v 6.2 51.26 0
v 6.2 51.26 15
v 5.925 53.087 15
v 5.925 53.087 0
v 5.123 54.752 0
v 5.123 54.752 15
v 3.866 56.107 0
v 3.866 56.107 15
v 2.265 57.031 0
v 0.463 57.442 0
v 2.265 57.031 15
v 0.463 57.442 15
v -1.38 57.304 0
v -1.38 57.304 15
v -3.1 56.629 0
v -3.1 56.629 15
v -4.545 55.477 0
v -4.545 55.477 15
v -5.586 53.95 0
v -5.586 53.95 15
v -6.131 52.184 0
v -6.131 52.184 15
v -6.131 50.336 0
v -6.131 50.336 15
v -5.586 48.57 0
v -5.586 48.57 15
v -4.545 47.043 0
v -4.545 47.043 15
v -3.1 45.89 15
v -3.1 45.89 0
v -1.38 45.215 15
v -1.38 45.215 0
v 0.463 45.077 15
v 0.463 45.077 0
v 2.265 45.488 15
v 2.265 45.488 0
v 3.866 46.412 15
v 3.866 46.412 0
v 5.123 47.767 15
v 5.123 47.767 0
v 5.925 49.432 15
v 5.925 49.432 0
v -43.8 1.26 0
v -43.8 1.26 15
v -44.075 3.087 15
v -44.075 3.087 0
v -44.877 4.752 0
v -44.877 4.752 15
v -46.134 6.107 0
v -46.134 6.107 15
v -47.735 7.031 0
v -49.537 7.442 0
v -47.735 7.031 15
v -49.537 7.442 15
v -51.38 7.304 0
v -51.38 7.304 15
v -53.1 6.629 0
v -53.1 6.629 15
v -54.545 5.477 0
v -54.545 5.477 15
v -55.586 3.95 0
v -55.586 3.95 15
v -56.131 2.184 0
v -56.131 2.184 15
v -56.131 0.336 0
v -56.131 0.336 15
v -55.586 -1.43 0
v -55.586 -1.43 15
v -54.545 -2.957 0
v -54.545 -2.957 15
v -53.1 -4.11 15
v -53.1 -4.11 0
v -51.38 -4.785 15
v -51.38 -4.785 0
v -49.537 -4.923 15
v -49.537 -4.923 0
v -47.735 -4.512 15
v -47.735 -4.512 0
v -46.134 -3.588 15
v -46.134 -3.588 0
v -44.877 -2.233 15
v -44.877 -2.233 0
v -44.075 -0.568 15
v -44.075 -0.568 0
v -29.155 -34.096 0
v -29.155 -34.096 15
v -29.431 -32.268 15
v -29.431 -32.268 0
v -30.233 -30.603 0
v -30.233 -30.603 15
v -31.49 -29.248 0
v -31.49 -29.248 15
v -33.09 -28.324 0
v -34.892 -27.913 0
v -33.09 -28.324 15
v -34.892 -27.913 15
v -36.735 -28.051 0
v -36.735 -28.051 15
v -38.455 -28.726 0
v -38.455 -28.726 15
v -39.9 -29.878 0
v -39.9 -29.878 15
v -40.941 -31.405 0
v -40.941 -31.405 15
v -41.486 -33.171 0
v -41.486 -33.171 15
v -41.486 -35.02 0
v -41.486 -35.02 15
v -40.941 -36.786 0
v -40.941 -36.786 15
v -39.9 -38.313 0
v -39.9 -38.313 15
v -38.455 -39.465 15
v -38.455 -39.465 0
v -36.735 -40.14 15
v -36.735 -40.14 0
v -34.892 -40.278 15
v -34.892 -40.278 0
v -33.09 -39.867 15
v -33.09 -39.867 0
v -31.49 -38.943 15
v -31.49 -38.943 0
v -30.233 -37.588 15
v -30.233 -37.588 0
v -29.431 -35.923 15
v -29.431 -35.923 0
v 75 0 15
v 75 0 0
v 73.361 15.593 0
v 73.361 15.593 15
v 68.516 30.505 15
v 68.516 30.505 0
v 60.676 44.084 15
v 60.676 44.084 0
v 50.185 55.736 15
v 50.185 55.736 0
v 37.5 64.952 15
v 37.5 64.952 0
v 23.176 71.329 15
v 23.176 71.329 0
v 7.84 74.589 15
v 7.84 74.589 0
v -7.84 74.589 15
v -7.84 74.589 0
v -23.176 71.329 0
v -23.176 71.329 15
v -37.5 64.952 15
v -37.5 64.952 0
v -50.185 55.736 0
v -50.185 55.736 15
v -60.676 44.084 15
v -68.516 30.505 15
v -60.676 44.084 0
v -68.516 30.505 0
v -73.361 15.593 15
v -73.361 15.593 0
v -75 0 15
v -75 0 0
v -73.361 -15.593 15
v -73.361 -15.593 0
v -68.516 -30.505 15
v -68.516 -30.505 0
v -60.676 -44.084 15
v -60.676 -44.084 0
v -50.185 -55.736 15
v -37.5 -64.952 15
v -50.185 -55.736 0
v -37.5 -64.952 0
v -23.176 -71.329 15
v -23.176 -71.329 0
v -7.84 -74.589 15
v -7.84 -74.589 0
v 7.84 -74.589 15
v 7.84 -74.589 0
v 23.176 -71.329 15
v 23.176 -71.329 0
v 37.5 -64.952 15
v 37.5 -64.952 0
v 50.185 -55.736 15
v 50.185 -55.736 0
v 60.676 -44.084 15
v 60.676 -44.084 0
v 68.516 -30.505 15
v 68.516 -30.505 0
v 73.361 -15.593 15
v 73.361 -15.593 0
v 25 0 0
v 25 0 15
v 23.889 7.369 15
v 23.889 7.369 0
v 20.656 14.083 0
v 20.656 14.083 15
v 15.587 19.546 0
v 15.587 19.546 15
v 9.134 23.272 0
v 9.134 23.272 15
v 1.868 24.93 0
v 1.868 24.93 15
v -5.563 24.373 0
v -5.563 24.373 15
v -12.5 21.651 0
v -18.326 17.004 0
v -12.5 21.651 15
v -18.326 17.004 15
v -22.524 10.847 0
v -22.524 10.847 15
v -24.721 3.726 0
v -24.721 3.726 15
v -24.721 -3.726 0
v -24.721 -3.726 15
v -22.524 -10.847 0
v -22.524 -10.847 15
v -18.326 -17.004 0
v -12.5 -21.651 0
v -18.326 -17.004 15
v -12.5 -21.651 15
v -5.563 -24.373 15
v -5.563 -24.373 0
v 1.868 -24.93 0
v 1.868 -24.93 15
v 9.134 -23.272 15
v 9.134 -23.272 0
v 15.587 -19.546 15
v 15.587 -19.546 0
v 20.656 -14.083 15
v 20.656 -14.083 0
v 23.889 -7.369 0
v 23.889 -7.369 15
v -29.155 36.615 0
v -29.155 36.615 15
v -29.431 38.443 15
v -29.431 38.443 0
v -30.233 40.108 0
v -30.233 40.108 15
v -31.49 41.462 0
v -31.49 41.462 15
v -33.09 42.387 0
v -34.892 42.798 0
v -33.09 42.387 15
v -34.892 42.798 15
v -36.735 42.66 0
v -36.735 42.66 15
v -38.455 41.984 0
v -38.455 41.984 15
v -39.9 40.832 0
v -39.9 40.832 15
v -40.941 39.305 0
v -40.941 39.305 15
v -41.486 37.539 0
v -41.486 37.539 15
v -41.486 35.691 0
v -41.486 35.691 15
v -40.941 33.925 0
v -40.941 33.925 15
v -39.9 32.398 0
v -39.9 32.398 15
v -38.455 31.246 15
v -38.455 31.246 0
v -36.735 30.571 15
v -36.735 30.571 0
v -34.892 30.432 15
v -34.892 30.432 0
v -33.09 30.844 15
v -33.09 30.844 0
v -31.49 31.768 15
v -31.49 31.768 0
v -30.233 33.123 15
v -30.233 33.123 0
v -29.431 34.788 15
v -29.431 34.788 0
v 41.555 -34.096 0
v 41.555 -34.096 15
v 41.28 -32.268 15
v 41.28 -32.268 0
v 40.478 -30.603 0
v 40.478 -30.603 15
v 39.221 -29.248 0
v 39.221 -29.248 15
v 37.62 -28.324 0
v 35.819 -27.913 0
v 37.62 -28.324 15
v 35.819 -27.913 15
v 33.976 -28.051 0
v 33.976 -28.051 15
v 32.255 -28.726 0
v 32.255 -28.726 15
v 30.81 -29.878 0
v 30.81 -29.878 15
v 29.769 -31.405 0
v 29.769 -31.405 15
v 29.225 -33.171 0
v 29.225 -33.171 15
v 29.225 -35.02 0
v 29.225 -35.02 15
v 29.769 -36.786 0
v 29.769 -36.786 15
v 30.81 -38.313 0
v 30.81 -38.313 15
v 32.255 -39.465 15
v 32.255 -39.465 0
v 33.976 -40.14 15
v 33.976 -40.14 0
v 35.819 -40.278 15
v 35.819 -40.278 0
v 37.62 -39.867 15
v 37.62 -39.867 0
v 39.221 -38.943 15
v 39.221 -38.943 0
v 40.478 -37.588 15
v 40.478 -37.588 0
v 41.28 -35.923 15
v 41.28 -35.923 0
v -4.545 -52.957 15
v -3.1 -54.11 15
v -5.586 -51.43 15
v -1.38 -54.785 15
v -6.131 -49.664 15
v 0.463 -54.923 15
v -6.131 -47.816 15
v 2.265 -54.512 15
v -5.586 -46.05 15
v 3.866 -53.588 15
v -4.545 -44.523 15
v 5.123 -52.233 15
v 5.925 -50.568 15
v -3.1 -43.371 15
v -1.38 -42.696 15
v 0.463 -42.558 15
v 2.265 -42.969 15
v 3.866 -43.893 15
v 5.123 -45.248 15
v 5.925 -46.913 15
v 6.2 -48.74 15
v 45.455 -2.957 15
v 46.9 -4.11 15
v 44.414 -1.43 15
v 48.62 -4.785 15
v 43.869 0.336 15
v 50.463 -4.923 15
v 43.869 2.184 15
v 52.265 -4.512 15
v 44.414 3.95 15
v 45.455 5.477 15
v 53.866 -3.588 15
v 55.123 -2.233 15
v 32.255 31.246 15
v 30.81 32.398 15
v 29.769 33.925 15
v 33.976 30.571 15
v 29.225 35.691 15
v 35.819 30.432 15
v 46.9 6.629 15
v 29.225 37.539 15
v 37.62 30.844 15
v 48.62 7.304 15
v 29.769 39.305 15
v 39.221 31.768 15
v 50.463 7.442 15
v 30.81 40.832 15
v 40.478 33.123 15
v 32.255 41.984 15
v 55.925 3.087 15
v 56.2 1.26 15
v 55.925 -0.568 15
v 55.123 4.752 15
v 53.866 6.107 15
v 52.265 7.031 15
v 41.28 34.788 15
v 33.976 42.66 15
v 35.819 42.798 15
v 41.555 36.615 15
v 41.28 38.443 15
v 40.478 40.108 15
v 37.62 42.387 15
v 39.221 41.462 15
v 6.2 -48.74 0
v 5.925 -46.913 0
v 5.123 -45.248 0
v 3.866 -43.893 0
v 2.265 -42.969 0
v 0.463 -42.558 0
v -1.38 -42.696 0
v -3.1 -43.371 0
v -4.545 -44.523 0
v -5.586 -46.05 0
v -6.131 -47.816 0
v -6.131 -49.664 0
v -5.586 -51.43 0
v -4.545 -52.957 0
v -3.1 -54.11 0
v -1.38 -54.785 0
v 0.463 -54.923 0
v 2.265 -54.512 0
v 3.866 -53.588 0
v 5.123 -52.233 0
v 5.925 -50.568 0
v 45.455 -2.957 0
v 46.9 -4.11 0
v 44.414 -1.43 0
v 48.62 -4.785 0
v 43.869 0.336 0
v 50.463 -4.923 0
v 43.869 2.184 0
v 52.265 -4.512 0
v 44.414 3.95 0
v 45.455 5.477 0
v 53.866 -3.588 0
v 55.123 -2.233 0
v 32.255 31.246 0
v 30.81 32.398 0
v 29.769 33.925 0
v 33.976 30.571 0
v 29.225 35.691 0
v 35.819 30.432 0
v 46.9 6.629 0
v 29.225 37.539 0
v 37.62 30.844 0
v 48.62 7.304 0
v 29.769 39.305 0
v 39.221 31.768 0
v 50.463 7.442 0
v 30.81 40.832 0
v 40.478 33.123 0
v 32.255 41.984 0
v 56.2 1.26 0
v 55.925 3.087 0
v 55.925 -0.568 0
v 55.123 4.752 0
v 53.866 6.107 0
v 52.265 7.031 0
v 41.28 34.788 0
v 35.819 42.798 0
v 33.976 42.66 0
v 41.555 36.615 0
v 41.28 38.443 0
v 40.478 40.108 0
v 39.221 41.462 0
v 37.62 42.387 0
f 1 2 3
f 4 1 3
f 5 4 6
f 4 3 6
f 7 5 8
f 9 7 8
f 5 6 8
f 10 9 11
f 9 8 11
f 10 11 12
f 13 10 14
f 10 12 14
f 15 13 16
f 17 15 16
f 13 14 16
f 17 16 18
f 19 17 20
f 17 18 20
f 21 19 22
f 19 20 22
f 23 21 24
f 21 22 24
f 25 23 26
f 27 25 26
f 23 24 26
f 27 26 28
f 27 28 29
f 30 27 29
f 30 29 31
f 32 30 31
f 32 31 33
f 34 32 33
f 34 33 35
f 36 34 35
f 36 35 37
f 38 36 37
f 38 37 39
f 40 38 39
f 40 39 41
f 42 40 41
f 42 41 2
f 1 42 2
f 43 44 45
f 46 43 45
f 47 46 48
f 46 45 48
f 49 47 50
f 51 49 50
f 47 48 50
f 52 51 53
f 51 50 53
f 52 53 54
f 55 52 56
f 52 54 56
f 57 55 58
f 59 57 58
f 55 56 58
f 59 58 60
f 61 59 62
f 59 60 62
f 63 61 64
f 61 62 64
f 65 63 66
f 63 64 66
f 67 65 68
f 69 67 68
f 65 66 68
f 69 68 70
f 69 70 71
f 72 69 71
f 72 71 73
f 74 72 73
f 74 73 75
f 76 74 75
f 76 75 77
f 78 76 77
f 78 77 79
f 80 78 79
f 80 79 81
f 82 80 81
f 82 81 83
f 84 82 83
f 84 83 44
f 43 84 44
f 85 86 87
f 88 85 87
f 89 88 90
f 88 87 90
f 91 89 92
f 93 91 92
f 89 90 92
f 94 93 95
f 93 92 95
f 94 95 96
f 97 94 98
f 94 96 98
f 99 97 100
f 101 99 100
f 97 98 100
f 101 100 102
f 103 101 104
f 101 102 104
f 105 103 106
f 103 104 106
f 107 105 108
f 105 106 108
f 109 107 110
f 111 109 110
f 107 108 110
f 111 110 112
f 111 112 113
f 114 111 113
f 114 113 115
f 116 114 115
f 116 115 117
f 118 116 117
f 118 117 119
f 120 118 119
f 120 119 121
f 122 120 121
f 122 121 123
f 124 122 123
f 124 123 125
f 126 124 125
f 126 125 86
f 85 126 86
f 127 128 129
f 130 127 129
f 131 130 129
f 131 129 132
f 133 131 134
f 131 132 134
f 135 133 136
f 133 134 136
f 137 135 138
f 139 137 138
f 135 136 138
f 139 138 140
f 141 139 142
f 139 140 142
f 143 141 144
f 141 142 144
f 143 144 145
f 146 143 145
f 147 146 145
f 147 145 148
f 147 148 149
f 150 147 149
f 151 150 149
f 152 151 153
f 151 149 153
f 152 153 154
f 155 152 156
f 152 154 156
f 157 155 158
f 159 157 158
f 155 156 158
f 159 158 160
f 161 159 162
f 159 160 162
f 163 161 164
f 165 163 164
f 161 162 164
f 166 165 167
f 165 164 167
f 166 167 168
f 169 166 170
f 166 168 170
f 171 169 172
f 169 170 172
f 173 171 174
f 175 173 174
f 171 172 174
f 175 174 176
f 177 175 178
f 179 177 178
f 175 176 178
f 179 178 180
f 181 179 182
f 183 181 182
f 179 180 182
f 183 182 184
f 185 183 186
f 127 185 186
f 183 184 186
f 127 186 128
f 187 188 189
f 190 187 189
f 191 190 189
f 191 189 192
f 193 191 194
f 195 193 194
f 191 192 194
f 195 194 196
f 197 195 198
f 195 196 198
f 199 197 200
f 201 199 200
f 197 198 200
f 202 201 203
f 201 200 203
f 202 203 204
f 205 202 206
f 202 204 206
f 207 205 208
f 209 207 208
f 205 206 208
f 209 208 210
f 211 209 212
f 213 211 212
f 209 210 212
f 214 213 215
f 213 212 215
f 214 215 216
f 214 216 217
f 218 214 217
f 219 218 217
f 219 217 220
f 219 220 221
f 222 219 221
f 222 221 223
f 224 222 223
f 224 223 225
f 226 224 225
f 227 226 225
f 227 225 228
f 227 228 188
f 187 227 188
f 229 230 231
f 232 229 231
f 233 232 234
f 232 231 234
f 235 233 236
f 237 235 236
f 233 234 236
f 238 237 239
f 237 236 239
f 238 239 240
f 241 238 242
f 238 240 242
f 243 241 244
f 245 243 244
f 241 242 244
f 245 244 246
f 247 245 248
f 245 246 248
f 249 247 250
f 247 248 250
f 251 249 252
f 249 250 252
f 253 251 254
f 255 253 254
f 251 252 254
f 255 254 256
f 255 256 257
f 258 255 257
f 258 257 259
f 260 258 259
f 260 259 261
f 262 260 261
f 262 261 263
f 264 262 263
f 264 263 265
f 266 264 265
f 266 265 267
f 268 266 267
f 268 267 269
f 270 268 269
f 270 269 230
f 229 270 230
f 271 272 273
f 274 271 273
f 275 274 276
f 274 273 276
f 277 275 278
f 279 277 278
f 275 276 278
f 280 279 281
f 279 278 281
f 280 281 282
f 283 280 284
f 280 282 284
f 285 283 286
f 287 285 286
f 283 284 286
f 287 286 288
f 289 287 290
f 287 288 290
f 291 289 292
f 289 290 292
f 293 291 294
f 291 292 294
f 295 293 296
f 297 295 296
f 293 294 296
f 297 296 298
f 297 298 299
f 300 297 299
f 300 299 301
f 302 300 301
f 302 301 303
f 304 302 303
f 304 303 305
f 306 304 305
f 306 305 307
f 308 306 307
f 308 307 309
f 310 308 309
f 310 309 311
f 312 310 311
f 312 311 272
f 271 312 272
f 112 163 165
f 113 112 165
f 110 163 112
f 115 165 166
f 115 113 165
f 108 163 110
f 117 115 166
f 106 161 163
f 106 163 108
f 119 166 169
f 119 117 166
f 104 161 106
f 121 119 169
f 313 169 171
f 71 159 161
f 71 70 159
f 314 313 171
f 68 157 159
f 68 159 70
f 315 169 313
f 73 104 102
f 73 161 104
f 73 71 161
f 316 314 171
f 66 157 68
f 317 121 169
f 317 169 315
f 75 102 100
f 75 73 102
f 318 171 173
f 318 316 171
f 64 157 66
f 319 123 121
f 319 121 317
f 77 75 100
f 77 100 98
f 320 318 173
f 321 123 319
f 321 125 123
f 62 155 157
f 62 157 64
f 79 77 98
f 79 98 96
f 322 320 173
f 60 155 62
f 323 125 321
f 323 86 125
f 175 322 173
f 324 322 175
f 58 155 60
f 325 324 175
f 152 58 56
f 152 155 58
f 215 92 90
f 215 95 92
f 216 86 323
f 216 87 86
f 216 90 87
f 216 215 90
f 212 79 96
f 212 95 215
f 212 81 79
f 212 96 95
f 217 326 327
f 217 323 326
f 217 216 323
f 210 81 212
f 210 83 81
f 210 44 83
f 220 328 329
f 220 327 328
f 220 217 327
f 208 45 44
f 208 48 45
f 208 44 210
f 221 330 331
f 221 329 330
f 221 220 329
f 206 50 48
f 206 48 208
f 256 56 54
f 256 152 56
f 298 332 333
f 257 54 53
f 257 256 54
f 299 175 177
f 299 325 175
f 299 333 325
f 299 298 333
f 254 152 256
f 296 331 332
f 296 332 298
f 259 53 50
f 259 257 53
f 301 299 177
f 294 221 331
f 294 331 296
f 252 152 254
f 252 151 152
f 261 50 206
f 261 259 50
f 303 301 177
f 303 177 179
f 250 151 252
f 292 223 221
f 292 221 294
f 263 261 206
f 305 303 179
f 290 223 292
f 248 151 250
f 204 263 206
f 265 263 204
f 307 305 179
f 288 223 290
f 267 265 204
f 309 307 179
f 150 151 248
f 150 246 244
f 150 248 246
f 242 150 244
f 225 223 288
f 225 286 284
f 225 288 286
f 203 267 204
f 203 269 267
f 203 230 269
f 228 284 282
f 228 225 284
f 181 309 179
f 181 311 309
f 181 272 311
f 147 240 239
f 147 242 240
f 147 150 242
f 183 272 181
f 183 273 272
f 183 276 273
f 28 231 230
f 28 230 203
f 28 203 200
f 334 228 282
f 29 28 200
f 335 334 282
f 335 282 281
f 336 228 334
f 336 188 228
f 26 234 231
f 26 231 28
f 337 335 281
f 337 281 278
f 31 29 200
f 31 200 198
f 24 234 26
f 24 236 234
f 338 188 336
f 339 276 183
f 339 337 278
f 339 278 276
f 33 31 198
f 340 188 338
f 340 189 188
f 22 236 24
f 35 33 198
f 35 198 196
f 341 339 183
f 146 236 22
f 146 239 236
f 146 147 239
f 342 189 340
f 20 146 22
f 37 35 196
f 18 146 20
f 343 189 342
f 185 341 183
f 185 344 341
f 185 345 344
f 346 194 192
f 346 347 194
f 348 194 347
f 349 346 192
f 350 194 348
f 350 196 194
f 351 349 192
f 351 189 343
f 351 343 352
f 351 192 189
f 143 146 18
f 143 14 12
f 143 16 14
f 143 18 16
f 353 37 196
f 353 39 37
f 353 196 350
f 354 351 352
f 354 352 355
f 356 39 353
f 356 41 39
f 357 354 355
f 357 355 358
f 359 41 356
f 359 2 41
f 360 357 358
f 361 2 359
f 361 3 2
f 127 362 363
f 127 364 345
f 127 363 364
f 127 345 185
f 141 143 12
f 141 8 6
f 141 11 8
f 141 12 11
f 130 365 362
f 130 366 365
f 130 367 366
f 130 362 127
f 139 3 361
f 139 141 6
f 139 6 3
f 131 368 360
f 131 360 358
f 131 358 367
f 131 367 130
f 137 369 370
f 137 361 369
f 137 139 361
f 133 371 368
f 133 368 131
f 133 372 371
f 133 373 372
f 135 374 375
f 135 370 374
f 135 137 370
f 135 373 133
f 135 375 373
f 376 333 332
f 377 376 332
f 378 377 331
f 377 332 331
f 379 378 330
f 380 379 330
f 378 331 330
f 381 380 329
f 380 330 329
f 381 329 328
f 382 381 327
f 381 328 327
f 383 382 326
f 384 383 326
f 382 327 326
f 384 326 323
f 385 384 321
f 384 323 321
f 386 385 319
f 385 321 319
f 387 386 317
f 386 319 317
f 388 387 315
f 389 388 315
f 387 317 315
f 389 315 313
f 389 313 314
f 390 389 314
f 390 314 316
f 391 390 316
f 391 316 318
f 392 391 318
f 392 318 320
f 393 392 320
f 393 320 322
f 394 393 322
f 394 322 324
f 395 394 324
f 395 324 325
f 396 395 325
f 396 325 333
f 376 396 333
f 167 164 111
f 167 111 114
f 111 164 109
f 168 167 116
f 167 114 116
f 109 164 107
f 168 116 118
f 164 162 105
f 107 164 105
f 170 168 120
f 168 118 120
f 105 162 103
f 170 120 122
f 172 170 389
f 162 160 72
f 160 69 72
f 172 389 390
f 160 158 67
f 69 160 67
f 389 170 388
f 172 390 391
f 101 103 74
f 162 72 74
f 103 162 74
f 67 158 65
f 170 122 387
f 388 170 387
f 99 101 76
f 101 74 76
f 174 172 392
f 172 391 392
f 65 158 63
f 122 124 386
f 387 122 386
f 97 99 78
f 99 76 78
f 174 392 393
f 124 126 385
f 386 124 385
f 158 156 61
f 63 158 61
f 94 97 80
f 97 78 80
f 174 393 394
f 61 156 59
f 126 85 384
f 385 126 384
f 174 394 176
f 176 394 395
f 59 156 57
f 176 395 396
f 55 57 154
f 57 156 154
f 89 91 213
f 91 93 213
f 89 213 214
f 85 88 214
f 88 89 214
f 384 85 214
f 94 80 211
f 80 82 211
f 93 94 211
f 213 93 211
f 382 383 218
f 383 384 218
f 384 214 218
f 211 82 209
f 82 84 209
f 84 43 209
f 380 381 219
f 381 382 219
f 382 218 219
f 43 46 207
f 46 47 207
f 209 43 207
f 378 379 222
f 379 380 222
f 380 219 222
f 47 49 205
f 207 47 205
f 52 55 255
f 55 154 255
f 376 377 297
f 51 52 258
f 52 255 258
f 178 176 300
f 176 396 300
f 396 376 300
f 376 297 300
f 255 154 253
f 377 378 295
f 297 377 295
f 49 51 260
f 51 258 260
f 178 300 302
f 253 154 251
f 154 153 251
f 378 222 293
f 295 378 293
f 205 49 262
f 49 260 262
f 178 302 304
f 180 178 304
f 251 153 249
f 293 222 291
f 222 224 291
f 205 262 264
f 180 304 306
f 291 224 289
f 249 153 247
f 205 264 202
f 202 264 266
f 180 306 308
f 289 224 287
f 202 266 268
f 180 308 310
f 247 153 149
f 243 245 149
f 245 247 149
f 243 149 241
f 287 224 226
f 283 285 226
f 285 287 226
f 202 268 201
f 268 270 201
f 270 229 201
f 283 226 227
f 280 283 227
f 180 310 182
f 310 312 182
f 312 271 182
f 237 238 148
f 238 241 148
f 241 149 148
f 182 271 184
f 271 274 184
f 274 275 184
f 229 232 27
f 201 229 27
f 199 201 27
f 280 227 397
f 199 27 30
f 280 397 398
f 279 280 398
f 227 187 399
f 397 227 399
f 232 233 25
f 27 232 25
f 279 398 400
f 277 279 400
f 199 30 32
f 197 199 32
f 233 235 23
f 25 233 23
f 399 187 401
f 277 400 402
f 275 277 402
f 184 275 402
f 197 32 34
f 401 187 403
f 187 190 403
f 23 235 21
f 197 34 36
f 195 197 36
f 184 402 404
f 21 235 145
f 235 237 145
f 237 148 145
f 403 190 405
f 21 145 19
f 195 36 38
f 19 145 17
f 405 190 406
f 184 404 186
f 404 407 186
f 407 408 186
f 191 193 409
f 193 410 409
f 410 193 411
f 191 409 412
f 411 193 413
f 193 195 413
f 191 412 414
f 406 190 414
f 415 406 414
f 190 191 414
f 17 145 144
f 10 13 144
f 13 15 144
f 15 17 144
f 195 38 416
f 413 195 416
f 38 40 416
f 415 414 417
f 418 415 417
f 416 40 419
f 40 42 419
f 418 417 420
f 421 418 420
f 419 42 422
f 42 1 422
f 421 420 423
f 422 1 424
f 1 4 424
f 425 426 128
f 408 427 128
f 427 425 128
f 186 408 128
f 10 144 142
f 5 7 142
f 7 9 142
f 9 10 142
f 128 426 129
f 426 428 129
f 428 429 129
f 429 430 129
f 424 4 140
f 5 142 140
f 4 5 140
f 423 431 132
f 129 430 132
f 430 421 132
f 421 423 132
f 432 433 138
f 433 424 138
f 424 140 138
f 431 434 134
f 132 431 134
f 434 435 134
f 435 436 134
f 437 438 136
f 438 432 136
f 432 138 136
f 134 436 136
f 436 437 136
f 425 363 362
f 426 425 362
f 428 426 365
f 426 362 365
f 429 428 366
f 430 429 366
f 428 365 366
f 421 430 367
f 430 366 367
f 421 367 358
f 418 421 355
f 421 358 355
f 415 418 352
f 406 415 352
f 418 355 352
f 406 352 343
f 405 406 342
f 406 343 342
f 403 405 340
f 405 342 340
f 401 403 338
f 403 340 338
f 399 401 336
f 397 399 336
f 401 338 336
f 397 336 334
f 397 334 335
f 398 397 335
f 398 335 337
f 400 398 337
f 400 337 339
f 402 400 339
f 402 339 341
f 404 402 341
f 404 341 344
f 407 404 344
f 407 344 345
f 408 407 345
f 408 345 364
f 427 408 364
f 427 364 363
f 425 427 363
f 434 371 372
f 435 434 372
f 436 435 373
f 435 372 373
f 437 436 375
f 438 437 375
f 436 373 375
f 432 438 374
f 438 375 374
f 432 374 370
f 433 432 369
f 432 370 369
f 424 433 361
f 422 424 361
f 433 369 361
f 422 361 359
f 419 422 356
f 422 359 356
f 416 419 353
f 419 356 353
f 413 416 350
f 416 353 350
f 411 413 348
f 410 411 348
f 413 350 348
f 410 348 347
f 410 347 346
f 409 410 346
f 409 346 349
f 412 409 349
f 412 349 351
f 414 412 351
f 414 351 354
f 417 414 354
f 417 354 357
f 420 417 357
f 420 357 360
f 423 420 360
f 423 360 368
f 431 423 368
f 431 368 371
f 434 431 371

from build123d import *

# Parameters (mm, degrees)
F0_R     = 75
F1_DEPTH = 15
F2_R     = 6.2
F3_DEPTH = 25
F4_R     = 25
F5_DEPTH = 25


with BuildPart() as f1:
    # F0 (on Top) → F1 (new body)
    with BuildSketch(Plane.XY):
        Circle(F0_R)
    extrude(amount=F1_DEPTH)

    # F2 (on face) → F3 (cut)
    with BuildSketch(Plane.XY.offset(15)):
        with Locations((0, 51.259788)):
            Circle(F2_R)
        with Locations((-35.355339, -34.095551)):
            Circle(F2_R)
        with Locations((-50, 1.259788)):
            Circle(F2_R)
        with Locations((-35.355339, 36.615127)):
            Circle(F2_R)
        with Locations((0, -48.740212)):
            Circle(F2_R)
        with Locations((35.355339, -34.095551)):
            Circle(F2_R)
        with Locations((50, 1.259788)):
            Circle(F2_R)
        with Locations((35.355339, 36.615127)):
            Circle(F2_R)
    extrude(amount=-F3_DEPTH, mode=Mode.SUBTRACT)

    # F4 (on face) → F5 (cut)
    with BuildSketch(Plane.XY.offset(15)):
        Circle(F4_R)
    extrude(amount=-F5_DEPTH, mode=Mode.SUBTRACT)


solid = f1.part
